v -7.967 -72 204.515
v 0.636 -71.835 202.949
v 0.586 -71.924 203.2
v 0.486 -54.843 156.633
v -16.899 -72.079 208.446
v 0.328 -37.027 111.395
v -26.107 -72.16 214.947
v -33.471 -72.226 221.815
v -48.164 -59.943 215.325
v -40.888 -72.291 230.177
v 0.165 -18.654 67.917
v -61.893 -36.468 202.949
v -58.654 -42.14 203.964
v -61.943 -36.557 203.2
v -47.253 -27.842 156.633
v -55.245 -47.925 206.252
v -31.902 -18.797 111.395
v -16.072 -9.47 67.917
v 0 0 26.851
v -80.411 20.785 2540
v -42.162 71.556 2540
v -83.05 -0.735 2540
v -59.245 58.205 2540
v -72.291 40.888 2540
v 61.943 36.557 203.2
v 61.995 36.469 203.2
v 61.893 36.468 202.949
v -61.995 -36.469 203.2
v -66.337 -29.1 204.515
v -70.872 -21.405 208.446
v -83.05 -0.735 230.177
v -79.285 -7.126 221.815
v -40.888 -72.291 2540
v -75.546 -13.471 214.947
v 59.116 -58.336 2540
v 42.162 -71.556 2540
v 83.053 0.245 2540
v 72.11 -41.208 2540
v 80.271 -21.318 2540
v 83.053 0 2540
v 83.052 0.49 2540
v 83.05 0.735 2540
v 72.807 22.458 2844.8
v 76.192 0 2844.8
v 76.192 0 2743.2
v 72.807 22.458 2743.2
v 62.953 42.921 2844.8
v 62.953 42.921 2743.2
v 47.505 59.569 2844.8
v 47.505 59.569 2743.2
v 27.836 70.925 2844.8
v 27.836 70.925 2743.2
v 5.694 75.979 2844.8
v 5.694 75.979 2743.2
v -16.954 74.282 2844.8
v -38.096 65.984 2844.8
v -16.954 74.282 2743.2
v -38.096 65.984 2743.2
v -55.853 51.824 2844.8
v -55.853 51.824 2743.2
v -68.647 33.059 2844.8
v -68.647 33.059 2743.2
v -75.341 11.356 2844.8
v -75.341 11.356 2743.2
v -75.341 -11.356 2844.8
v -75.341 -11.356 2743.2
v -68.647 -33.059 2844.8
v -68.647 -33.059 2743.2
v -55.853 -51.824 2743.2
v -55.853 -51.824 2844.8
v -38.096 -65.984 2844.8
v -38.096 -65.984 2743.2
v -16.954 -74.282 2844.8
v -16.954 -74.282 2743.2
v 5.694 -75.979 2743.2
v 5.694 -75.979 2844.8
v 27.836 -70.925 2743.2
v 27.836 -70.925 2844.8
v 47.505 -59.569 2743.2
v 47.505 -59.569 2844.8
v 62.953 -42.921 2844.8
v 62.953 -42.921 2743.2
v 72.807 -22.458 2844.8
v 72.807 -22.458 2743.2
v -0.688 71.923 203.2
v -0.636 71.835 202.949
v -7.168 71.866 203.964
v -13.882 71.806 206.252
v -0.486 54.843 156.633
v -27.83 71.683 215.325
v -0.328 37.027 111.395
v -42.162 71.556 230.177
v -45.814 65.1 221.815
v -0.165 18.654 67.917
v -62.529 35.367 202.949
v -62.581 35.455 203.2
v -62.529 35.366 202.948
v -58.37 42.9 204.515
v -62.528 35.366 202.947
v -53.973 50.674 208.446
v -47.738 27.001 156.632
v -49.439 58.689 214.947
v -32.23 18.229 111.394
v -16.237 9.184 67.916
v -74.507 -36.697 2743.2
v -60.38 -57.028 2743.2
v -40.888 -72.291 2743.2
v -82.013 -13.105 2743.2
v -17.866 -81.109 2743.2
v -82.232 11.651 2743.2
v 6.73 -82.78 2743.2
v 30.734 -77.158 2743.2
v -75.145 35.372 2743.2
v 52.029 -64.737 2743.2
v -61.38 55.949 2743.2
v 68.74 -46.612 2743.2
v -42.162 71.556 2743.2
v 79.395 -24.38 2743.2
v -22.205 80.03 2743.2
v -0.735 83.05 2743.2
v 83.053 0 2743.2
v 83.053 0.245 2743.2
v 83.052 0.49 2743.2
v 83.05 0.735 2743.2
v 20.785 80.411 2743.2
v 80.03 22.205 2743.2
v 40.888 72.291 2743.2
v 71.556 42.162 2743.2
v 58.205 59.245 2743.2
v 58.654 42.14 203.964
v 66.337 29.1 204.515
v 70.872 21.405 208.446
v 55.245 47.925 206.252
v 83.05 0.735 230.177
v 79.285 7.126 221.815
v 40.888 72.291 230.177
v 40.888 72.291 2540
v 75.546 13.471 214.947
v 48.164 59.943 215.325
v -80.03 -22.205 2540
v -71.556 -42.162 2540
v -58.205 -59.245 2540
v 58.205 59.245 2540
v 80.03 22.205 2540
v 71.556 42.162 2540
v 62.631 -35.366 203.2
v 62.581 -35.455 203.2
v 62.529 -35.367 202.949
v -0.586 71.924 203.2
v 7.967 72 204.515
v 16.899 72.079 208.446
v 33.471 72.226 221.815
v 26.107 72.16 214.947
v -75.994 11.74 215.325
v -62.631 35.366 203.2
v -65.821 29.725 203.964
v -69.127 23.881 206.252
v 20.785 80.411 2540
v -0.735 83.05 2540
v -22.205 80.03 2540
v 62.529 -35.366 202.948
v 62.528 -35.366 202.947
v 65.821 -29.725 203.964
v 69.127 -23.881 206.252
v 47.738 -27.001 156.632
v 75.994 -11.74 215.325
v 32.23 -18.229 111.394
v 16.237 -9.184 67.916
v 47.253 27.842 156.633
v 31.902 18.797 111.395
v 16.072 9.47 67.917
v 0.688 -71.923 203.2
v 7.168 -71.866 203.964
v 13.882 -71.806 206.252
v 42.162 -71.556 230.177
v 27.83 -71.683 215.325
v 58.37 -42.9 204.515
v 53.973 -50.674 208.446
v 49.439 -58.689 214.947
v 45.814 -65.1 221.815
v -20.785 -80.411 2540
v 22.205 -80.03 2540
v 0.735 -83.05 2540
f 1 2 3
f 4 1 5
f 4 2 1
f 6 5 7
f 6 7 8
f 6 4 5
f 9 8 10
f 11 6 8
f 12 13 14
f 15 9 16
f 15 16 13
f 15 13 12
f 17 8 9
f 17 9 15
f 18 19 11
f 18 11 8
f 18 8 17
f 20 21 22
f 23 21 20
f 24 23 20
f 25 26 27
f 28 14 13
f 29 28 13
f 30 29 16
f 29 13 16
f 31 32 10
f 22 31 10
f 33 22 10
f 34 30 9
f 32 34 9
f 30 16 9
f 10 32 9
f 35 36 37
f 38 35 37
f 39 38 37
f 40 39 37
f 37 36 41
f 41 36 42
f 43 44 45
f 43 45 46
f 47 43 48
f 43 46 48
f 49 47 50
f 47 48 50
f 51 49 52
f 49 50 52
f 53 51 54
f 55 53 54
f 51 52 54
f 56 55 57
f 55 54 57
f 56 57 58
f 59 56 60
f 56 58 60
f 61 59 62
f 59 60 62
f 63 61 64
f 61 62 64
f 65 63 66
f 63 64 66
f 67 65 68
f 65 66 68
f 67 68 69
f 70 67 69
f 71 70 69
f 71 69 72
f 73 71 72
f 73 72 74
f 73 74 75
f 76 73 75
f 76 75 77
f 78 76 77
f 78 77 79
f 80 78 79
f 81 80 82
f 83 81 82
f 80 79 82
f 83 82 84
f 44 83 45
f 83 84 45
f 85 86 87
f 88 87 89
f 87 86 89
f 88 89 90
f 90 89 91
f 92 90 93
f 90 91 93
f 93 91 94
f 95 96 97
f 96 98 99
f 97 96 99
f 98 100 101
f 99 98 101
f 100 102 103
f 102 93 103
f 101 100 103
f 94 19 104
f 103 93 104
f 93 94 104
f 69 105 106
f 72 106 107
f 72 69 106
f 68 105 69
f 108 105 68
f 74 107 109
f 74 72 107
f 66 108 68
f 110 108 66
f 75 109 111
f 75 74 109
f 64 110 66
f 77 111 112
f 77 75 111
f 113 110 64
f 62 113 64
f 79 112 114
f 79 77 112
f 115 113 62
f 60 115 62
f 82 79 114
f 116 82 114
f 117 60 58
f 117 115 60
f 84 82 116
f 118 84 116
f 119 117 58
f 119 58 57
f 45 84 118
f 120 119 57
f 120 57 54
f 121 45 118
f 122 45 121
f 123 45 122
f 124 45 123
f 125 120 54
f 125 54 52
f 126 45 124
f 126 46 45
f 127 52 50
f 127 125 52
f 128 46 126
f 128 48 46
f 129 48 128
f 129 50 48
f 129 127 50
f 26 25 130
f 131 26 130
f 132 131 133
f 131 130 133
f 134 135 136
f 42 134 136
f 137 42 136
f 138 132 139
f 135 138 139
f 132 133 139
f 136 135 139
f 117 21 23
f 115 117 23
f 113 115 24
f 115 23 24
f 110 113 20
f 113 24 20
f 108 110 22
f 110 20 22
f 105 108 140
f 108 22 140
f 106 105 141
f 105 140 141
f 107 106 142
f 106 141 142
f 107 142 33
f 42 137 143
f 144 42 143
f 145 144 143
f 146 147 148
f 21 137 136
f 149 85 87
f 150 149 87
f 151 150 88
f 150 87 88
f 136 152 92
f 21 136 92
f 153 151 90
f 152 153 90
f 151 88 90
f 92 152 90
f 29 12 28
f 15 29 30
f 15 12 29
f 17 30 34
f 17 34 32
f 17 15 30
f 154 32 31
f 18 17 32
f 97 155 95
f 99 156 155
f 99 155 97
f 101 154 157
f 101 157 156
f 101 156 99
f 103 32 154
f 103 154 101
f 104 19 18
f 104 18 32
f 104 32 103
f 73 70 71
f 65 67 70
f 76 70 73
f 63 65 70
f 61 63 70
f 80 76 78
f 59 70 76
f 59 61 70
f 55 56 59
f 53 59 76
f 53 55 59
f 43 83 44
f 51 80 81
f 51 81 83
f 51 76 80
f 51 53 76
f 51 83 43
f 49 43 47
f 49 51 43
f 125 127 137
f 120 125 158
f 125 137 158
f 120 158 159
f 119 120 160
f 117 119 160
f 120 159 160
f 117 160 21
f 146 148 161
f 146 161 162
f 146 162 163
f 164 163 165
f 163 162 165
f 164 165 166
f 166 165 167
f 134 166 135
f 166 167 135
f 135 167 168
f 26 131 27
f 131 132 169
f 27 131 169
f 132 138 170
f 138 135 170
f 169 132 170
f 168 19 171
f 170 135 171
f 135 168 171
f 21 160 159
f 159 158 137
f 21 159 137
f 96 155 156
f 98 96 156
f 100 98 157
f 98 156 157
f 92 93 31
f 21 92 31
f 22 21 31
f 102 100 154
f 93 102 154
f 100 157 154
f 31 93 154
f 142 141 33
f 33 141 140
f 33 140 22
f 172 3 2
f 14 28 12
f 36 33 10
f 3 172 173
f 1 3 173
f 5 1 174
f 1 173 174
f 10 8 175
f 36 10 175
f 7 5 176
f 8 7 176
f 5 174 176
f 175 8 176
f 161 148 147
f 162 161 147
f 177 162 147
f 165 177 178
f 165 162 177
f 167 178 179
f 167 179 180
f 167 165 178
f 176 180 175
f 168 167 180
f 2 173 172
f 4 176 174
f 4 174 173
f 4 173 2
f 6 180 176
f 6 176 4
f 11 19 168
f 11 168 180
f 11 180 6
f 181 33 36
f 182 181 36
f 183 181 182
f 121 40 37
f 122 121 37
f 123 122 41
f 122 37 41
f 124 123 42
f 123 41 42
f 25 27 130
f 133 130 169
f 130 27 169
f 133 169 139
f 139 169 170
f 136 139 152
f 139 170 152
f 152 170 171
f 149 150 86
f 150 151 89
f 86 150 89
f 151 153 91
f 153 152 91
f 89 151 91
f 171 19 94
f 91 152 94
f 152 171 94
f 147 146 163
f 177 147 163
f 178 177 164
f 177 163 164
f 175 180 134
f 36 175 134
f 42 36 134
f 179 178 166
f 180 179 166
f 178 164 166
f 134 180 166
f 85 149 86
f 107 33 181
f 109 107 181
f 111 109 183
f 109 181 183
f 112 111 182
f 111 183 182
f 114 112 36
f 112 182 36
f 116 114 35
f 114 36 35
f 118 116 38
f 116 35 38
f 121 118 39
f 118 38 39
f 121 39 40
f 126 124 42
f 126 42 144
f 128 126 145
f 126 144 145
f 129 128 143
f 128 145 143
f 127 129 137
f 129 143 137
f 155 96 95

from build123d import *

# Parameters (mm, degrees)
F1_DEPTH     = 2540
F3_DEPTH     = 203.2
F4_R         = 76.1921609871
F5_DEPTH     = 101.6
F6_SIZE2     = 203.2
F6_SIZE      = 71.882
F7_T1_DEPTH  = 494.4083201135
F7_T3_DEPTH  = 494.4083201135
F7_T5_DEPTH  = 494.4083201135
F7_T7_DEPTH  = 494.4083201135
F7_T9_DEPTH  = 494.4083201135
F7_T11_DEPTH = 494.4083201135


# Not quite as in the source:
# - a fillet or chamfer that OpenCascade refuses, or shapes differently, is made with other operations: its cross-section is extruded or revolved along the edge and cut away or added


with BuildPart() as f1:
    # F0 (on Top) → F1 (new body)
    with BuildSketch(Plane.XY):
        Polygon((42.1619373396, -71.5559341018), (83.0502253935, 0.735341758), (40.8882880539, 72.2912758598), (-42.1619373396, 71.5559341018), (-83.0502253935, -0.735341758), (-40.8882880539, -72.2912758598), align=None)
    extrude(amount=F1_DEPTH)

    # F2 (on face) → F3 (join)
    with BuildSketch(Plane.XY.offset(2540)):
        with BuildLine():
            ThreePointArc((-40.8882880539, -72.2912758598), (0.735341758, -83.0502253935), (42.1619373396, -71.5559341018))
            Line((42.1619373396, -71.5559341018), (-40.8882880539, -72.2912758598))
        make_face()
        with BuildLine():
            ThreePointArc((-83.0502253935, -0.735341758), (-71.5559341018, -42.1619373396), (-40.8882880539, -72.2912758598))
            Line((-40.8882880539, -72.2912758598), (-83.0502253935, -0.735341758))
        make_face()
        with BuildLine():
            Line((-83.0502253935, -0.735341758), (-42.1619373396, 71.5559341018))
            ThreePointArc((-42.1619373396, 71.5559341018), (-72.2912758598, 40.8882880539), (-83.0502253935, -0.735341758))
        make_face()
        Polygon((42.1619373396, -71.5559341018), (83.0502253935, 0.735341758), (40.8882880539, 72.2912758598), (-42.1619373396, 71.5559341018), (-83.0502253935, -0.735341758), (-40.8882880539, -72.2912758598), align=None)
        with BuildLine():
            ThreePointArc((42.1619373396, -71.5559341018), (72.1095566371, -41.2079180135), (83.0534807543, 0))
            ThreePointArc((83.0534807543, 0), (83.0526669101, 0.3676744818), (83.0502253935, 0.735341758))
            Line((83.0502253935, 0.735341758), (42.1619373396, -71.5559341018))
        make_face()
        with BuildLine():
            Line((40.8882880539, 72.2912758598), (83.0502253935, 0.735341758))
            ThreePointArc((83.0502253935, 0.735341758), (71.5559341018, 42.1619373396), (40.8882880539, 72.2912758598))
        make_face()
        with BuildLine():
            Line((-42.1619373396, 71.5559341018), (40.8882880539, 72.2912758598))
            ThreePointArc((40.8882880539, 72.2912758598), (-0.735341758, 83.0502253935), (-42.1619373396, 71.5559341018))
        make_face()
    extrude(amount=F3_DEPTH)

    # F4 (on face) → F5 (join)
    with BuildSketch(Plane.XY.offset(2743.2)):
        Circle(F4_R)
    extrude(amount=F5_DEPTH)

    # F6
    f6_edges = [f1.edges().sort_by_distance(p)[0] for p in [
        (62.606081, -35.410296, 0),
        (61.969257, 36.513309, 0),
        (-0.636825, 71.923605, 0),
        (-62.606081, 35.410296, 0),
        (-61.969257, -36.513309, 0),
        (0.636825, -71.923605, 0),
    ]]
    f6_side = f1.faces().sort_by_distance((0, 0, 0))[0]
    chamfer(f6_edges, length=F6_SIZE, length2=F6_SIZE2, reference=f6_side)

    # F7: fillet of radius 76.2 on 6 edges, made by hand

    # F7_s2 → F7_t1 (cut)
    with BuildSketch(Plane(origin=(-18.9514614698, -33.5065465998, -94.2401135792), x_dir=(-0.8704183762, 0.4923127566, 0), z_dir=(0.1861654151, 0.329144017, 0.9257465389))):
        with BuildLine():
            ThreePointArc((-35.9188045712, 19.1503954496), (0, 10.1536652969), (35.9188045712, 19.1503954496))
            Line((35.9188045712, 19.1503954496), (0, -0.0474877004))
            Line((0, -0.0474877004), (-35.9188045712, 19.1503954496))
        make_face()
    extrude(amount=F7_T1_DEPTH, mode=Mode.SUBTRACT)

    # F7_s4 → F7_t3 (cut)
    with BuildSketch(Plane(origin=(19.5417898136, -33.1657203716, -94.2401135792), x_dir=(-0.8615645419, -0.5076480475, 0), z_dir=(-0.1919643727, 0.3257959873, 0.9257465389))):
        with BuildLine():
            ThreePointArc((-35.9188045712, 19.1503954496), (0, 10.1536652969), (35.9188045712, 19.1503954496))
            Line((35.9188045712, 19.1503954496), (0, -0.0474877004))
            Line((0, -0.0474877004), (-35.9188045712, 19.1503954496))
        make_face()
    extrude(amount=F7_T3_DEPTH, mode=Mode.SUBTRACT)

    # F7_s6 → F7_t5 (cut)
    with BuildSketch(Plane(origin=(38.4932512834, 0.3408262282, -94.2401135792), x_dir=(0.0088538343, -0.999960804, 0), z_dir=(-0.3781297878, -0.0033480297, 0.9257465389))):
        with BuildLine():
            ThreePointArc((35.9188045712, 19.1503954496), (0, 10.1536652969), (-35.9188045712, 19.1503954496))
            Line((-35.9188045712, 19.1503954496), (0, -0.0474877004))
            Line((0, -0.0474877004), (35.9188045712, 19.1503954496))
        make_face()
    extrude(amount=F7_T5_DEPTH, mode=Mode.SUBTRACT)

    # F7_s8 → F7_t7 (cut)
    with BuildSketch(Plane(origin=(18.9514614698, 33.5065465998, -94.2401135792), x_dir=(0.8704183762, -0.4923127566, 0), z_dir=(-0.1861654151, -0.329144017, 0.9257465389))):
        with BuildLine():
            ThreePointArc((35.9188045712, 19.1503954496), (0, 10.1536652969), (-35.9188045712, 19.1503954496))
            Line((-35.9188045712, 19.1503954496), (0, -0.0474877004))
            Line((0, -0.0474877004), (35.9188045712, 19.1503954496))
        make_face()
    extrude(amount=F7_T7_DEPTH, mode=Mode.SUBTRACT)

    # F7_s10 → F7_t9 (cut)
    with BuildSketch(Plane(origin=(-19.5417898136, 33.1657203716, -94.2401135792), x_dir=(0.8615645419, 0.5076480475, 0), z_dir=(0.1919643727, -0.3257959873, 0.9257465389))):
        with BuildLine():
            ThreePointArc((35.9188045712, 19.1503954496), (0, 10.1536652969), (-35.9188045712, 19.1503954496))
            Line((-35.9188045712, 19.1503954496), (0, -0.0474877004))
            Line((0, -0.0474877004), (35.9188045712, 19.1503954496))
        make_face()
    extrude(amount=F7_T9_DEPTH, mode=Mode.SUBTRACT)

    # F7_s12 → F7_t11 (cut)
    with BuildSketch(Plane(origin=(-38.4932512834, -0.3408262282, -94.2401135792), x_dir=(-0.0088538343, 0.999960804, 0), z_dir=(0.3781297878, 0.0033480297, 0.9257465389))):
        with BuildLine():
            ThreePointArc((-35.9188045712, 19.1503954496), (0, 10.1536652969), (35.9188045712, 19.1503954496))
            Line((35.9188045712, 19.1503954496), (0, -0.0474877004))
            Line((0, -0.0474877004), (-35.9188045712, 19.1503954496))
        make_face()
    extrude(amount=F7_T11_DEPTH, mode=Mode.SUBTRACT)


solid = f1.part
